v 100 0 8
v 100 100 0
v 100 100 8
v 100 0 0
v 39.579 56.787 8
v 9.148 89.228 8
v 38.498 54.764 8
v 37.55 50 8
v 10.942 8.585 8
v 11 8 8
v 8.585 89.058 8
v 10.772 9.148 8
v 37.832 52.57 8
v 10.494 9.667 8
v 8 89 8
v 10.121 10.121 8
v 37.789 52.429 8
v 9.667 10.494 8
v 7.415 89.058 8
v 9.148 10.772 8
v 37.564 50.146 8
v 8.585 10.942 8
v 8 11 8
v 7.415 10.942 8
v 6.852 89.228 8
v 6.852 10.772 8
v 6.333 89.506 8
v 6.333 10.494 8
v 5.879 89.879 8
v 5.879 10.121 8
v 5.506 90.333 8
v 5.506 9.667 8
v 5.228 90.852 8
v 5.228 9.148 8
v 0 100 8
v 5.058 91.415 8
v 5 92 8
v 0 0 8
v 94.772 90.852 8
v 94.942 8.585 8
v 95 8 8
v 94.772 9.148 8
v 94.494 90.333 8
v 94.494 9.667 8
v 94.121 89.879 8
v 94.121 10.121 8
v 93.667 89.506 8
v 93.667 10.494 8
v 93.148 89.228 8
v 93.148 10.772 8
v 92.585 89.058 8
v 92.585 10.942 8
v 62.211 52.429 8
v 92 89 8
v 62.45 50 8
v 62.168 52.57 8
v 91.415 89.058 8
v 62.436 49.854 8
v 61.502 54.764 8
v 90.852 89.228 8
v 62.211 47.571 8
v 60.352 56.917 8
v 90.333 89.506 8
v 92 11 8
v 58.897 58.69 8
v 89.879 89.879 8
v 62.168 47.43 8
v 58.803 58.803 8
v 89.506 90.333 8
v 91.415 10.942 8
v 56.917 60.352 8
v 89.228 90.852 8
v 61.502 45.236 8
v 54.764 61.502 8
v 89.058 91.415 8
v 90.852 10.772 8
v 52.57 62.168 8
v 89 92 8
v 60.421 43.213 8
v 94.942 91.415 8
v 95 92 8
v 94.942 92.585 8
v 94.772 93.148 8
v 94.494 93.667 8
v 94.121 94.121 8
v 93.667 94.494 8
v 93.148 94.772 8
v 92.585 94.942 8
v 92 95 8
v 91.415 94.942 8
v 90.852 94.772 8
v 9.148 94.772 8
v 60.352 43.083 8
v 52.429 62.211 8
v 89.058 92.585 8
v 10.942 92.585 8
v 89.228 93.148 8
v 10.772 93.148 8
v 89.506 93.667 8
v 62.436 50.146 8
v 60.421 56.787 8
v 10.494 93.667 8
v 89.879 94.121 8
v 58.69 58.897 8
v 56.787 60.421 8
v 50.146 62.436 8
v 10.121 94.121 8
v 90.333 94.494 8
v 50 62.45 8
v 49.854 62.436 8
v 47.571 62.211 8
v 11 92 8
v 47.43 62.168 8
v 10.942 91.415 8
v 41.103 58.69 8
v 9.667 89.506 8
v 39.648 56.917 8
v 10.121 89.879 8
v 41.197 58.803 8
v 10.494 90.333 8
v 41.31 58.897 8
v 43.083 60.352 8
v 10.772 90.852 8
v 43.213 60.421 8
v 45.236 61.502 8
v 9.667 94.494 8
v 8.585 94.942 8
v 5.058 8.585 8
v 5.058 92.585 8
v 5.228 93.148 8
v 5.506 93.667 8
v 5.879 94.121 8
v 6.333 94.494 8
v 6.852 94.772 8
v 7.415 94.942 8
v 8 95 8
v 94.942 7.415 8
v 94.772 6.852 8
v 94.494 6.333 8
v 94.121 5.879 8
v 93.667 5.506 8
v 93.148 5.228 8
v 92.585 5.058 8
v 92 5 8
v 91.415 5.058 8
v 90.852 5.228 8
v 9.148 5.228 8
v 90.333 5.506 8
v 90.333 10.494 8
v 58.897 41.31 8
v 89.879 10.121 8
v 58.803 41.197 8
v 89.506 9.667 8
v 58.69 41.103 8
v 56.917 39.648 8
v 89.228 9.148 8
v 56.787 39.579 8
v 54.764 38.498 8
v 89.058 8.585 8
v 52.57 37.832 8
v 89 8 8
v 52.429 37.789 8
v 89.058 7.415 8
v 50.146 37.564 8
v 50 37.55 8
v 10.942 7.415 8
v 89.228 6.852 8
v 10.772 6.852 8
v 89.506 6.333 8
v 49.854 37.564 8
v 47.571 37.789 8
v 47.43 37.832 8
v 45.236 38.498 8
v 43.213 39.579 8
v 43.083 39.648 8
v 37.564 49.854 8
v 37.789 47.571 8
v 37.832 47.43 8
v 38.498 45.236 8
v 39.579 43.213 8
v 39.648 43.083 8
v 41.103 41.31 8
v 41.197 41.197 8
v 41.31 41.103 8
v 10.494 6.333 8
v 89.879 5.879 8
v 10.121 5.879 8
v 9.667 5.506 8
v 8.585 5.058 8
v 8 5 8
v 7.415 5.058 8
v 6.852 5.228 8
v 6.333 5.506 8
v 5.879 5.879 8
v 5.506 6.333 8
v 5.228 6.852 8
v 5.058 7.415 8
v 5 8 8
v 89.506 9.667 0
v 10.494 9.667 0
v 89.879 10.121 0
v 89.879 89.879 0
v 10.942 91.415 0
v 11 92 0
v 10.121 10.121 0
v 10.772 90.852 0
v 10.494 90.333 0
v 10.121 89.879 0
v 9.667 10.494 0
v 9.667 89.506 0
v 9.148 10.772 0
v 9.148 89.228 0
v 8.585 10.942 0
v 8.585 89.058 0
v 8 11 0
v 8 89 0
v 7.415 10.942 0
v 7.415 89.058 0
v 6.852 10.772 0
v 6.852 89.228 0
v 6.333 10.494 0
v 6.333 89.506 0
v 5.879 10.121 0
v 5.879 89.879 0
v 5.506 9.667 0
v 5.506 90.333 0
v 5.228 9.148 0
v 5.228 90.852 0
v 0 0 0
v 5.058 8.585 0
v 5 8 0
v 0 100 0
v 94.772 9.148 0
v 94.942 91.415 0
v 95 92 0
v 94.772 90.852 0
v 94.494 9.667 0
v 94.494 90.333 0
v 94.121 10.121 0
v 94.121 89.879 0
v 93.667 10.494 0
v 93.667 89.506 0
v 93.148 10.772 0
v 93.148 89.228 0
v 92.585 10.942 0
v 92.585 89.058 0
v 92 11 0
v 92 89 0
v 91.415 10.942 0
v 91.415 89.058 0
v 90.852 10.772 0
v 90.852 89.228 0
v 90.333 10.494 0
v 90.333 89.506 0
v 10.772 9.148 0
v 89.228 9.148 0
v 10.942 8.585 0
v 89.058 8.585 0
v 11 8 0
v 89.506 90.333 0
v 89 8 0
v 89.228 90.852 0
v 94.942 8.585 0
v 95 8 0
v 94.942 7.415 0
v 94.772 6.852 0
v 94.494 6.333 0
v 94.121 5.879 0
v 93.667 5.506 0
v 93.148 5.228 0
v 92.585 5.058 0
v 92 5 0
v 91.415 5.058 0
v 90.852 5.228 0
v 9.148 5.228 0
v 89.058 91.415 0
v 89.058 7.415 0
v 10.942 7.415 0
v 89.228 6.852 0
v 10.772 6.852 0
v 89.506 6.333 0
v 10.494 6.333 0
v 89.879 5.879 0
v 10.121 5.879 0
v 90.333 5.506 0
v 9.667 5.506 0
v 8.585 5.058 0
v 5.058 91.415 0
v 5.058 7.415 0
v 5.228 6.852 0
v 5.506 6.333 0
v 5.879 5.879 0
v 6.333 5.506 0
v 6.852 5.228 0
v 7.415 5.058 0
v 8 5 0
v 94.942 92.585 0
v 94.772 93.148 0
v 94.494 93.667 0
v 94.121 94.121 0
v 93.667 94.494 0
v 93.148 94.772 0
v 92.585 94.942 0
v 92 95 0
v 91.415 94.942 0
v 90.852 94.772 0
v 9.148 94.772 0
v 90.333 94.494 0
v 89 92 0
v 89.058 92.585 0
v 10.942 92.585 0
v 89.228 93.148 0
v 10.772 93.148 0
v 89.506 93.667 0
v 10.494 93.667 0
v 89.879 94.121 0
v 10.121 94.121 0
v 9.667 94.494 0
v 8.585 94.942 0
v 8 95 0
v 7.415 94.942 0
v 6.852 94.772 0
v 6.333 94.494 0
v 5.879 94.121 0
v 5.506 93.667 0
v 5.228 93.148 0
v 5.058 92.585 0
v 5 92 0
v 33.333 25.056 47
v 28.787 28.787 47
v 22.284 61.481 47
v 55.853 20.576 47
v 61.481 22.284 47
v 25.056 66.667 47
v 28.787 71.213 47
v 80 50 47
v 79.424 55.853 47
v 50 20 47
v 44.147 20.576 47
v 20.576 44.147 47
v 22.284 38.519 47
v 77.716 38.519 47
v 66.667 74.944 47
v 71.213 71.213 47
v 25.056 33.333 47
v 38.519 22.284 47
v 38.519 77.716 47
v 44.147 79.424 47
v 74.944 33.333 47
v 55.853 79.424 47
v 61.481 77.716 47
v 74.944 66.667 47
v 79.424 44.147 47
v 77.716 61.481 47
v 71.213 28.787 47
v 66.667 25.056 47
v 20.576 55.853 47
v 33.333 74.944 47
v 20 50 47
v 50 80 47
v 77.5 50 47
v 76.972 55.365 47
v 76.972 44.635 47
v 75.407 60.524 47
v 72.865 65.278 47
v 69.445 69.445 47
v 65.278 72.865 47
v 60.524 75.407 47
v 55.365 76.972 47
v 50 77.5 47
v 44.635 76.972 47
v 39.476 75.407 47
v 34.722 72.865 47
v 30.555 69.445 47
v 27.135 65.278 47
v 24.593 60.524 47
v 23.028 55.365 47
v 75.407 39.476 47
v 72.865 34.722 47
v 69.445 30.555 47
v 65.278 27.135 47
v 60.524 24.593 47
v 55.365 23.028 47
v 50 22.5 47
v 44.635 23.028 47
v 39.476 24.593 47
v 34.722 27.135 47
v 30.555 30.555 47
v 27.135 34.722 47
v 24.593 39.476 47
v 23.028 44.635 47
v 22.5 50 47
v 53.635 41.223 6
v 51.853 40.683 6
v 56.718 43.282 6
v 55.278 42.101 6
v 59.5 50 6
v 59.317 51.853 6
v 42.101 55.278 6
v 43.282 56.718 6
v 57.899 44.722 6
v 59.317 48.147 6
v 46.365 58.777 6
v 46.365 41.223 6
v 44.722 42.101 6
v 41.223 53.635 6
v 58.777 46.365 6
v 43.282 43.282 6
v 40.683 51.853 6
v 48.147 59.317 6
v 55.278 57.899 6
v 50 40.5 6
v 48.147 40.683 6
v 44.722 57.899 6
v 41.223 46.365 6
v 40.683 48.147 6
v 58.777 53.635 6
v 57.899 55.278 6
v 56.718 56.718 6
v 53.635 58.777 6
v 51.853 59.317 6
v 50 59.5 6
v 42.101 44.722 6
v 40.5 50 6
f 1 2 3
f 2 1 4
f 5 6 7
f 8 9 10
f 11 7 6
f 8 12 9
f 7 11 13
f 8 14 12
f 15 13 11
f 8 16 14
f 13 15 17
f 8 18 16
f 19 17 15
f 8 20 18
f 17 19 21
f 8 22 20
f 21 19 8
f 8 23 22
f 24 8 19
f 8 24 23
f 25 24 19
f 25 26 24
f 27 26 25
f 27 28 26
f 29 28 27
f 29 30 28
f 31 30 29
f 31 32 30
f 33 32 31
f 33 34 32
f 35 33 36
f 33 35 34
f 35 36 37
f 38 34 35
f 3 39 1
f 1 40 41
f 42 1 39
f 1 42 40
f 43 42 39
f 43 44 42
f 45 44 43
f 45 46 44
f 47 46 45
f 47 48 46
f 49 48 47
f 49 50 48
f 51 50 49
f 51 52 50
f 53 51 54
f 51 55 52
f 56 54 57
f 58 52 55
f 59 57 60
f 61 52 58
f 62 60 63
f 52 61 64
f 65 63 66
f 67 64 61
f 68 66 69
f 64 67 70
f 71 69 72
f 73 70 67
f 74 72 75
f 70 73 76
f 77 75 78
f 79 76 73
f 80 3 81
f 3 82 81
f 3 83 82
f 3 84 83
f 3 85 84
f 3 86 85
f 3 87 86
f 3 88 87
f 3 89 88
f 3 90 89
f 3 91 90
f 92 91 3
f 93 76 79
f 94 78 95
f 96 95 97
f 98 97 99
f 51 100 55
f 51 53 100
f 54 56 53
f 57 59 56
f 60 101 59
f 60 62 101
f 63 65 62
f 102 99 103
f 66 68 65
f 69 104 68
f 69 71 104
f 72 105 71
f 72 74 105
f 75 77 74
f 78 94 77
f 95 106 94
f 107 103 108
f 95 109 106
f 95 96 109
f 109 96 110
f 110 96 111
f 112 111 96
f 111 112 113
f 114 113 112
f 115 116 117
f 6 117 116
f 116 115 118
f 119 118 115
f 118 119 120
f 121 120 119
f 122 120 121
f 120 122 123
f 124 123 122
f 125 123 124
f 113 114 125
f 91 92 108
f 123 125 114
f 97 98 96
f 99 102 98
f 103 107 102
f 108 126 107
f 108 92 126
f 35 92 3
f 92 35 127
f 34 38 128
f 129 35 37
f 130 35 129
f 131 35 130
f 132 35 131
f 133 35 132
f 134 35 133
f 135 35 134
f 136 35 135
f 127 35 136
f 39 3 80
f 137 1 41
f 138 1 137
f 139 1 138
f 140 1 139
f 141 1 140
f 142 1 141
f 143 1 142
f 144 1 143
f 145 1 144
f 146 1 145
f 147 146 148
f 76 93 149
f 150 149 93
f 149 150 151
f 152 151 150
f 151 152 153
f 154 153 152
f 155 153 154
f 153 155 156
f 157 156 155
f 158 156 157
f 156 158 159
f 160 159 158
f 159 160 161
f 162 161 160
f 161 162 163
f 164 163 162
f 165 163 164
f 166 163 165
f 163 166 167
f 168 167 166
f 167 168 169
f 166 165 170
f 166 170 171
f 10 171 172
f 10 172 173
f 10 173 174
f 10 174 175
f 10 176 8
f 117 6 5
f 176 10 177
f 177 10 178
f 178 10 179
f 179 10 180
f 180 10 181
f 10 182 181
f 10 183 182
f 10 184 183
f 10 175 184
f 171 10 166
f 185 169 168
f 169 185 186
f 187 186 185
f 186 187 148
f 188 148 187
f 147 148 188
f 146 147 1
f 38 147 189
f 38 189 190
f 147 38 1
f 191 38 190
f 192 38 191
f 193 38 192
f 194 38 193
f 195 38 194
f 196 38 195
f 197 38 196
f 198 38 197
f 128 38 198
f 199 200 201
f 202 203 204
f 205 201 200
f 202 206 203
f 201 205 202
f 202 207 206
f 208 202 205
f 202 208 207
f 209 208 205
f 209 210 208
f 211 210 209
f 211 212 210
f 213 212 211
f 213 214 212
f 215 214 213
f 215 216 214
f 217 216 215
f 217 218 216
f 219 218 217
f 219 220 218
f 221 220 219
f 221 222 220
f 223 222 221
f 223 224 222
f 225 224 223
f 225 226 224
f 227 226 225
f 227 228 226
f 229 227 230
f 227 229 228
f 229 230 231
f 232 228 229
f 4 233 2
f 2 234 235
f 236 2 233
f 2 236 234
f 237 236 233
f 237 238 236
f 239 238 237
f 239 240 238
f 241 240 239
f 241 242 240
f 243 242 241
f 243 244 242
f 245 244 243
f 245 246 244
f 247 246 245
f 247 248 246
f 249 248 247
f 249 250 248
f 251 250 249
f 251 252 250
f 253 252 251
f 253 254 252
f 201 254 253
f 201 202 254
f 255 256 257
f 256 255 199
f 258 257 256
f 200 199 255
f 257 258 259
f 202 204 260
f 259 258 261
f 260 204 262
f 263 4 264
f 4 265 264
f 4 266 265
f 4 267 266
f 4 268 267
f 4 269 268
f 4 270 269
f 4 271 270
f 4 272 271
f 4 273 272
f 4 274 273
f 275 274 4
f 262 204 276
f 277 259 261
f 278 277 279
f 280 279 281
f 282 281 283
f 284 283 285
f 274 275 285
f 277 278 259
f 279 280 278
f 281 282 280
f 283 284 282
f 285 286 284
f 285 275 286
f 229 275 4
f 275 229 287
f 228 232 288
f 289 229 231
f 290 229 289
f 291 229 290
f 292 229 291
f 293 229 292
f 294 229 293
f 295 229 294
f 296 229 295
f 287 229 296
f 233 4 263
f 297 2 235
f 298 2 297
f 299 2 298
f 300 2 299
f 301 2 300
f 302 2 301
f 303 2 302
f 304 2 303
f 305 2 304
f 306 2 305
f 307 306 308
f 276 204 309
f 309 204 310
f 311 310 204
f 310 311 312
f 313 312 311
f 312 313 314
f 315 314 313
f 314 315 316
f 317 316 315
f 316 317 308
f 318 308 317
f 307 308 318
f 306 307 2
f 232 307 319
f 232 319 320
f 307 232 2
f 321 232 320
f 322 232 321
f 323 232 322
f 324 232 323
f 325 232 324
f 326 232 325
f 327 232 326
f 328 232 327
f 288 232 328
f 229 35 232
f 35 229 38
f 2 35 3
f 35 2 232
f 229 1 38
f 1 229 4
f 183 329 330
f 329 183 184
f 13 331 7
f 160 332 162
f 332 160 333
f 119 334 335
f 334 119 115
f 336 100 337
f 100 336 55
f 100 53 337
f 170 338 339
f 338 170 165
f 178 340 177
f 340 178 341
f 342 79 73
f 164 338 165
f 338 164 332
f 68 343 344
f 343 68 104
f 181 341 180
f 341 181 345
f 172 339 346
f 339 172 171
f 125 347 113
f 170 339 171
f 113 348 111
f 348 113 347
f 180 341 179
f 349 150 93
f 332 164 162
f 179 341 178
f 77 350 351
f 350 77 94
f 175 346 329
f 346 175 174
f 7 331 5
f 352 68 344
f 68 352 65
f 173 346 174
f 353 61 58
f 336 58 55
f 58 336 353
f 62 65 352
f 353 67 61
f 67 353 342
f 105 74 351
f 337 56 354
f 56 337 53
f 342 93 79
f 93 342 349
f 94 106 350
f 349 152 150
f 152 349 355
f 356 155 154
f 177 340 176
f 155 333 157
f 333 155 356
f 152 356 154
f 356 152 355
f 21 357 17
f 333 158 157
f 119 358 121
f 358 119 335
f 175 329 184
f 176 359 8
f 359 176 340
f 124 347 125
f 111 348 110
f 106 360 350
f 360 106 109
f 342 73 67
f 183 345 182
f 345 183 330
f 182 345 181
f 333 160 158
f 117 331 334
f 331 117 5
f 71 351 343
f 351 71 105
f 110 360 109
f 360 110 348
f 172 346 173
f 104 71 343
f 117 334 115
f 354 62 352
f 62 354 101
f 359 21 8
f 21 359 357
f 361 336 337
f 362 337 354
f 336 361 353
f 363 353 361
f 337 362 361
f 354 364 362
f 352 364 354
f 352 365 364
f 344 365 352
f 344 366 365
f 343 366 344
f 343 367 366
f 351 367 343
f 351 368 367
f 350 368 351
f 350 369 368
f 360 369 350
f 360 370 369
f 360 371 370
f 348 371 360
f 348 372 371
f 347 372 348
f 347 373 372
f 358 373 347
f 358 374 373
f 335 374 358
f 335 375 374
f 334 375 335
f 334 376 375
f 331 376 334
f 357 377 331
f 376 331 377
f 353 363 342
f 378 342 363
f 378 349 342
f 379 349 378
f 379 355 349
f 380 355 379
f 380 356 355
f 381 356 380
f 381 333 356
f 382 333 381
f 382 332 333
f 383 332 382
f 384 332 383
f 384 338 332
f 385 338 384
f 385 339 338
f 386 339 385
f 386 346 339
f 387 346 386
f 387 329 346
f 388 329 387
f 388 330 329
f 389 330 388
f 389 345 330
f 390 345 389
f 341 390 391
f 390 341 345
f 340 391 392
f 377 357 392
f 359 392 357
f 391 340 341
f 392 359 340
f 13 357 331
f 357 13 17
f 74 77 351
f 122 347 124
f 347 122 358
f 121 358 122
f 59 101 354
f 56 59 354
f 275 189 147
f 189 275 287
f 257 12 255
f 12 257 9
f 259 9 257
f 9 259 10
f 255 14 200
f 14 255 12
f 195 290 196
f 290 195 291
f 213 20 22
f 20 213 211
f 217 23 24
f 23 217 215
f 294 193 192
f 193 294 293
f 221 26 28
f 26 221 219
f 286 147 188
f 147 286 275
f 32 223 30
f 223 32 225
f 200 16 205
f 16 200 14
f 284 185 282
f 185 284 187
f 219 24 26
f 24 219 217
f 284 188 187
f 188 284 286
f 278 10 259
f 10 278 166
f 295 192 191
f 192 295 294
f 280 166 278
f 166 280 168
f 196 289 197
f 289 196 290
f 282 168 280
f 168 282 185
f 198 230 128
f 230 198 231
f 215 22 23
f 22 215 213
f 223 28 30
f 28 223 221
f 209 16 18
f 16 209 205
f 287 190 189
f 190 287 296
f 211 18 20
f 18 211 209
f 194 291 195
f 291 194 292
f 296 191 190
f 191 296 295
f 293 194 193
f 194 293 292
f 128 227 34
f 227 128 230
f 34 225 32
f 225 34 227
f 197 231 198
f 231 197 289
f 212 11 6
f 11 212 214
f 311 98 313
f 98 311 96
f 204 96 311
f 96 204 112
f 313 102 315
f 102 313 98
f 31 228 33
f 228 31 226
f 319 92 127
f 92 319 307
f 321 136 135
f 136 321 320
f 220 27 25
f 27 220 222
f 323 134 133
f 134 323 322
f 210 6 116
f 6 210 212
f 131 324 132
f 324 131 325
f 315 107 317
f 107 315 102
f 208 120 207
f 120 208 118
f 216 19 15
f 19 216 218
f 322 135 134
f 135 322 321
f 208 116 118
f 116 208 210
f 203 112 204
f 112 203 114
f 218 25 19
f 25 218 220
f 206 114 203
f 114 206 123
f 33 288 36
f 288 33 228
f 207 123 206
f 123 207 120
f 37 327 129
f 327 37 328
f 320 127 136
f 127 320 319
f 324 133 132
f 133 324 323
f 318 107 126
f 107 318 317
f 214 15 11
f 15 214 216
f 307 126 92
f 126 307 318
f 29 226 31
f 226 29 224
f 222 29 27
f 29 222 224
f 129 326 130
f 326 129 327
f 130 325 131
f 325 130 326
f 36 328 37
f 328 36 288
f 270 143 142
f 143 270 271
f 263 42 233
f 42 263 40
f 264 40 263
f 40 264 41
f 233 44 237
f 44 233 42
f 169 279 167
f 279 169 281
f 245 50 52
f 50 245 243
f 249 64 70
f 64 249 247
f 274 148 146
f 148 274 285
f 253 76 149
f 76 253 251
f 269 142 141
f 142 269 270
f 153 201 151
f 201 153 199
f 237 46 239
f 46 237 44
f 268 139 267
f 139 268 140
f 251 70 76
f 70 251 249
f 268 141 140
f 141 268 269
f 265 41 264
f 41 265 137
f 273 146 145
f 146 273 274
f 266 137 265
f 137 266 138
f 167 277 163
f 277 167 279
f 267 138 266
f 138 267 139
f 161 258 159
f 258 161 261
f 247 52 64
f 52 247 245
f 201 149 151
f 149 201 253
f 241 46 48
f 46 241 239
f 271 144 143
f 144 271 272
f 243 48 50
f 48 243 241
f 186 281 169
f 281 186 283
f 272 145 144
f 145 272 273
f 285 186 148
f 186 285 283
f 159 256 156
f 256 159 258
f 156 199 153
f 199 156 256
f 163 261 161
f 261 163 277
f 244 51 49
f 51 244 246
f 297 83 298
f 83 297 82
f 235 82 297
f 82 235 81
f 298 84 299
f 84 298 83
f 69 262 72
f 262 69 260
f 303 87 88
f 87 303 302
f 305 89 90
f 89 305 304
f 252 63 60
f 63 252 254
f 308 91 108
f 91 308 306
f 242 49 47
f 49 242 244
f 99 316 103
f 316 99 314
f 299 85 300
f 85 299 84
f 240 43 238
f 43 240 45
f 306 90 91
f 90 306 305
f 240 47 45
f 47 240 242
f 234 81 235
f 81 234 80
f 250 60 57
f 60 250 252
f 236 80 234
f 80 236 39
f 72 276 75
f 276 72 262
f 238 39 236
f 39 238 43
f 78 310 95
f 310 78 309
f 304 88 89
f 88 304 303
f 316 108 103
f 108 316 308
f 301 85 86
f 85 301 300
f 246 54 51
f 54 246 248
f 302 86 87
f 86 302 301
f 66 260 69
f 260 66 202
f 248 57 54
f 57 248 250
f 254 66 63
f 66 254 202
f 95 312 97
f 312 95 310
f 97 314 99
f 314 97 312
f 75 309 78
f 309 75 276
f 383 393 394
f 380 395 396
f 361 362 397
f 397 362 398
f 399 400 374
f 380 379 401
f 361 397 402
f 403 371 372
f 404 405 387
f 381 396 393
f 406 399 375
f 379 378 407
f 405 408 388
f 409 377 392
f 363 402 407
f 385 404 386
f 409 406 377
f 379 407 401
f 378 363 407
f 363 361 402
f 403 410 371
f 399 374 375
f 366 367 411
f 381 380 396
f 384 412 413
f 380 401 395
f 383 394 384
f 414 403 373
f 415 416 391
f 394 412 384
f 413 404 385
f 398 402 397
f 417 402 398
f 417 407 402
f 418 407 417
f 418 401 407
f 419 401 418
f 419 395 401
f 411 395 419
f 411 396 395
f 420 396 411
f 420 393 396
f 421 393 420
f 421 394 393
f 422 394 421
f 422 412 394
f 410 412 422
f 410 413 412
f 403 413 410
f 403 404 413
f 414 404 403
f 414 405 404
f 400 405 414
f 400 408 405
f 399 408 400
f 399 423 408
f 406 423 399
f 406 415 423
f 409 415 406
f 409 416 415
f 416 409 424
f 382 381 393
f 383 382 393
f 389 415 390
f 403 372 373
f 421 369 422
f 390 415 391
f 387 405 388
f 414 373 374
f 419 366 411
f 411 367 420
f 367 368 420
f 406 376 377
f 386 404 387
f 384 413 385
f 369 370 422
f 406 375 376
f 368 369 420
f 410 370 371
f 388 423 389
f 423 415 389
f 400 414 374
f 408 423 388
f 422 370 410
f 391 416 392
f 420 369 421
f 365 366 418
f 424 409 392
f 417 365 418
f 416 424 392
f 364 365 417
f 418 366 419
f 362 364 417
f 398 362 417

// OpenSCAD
$fn = 32;

// ----------------------------------------------------------------------
// Hopper: flanged with square flange
// ----------------------------------------------------------------------

// --- parameters (mm) ---
fl = 100;                 // flange side, X and Y
fl_t = 8;                 // flange thickness
cone_h = 40;              // cone height above the flange
top_d = 60;               // cone mouth diameter
bot_d = 24;               // cone spout diameter
wall = 2.5;               // cone wall thickness
hole_r = 3;               // flange hole radius
hole_in = 8;              // hole inset from the corners

bore_d = bot_d - 2 * wall;  // spout bore diameter
total_h = fl_t + cone_h - 1;  // overall height

difference() {
  union() {
    cube([fl, fl, fl_t]);
    translate([fl / 2, fl / 2, fl_t - 1])
      cylinder(h = cone_h, d1 = bot_d, d2 = top_d);
  }
  translate([fl / 2, fl / 2, fl_t - 2])
    cylinder(h = cone_h + 1, d1 = bore_d, d2 = top_d - 2 * wall);
  for (sx = [0, 1], sy = [0, 1])
    translate([sx ? fl - hole_in : hole_in,
               sy ? fl - hole_in : hole_in, -1])
      cylinder(r = hole_r, h = fl_t + 2);
}
